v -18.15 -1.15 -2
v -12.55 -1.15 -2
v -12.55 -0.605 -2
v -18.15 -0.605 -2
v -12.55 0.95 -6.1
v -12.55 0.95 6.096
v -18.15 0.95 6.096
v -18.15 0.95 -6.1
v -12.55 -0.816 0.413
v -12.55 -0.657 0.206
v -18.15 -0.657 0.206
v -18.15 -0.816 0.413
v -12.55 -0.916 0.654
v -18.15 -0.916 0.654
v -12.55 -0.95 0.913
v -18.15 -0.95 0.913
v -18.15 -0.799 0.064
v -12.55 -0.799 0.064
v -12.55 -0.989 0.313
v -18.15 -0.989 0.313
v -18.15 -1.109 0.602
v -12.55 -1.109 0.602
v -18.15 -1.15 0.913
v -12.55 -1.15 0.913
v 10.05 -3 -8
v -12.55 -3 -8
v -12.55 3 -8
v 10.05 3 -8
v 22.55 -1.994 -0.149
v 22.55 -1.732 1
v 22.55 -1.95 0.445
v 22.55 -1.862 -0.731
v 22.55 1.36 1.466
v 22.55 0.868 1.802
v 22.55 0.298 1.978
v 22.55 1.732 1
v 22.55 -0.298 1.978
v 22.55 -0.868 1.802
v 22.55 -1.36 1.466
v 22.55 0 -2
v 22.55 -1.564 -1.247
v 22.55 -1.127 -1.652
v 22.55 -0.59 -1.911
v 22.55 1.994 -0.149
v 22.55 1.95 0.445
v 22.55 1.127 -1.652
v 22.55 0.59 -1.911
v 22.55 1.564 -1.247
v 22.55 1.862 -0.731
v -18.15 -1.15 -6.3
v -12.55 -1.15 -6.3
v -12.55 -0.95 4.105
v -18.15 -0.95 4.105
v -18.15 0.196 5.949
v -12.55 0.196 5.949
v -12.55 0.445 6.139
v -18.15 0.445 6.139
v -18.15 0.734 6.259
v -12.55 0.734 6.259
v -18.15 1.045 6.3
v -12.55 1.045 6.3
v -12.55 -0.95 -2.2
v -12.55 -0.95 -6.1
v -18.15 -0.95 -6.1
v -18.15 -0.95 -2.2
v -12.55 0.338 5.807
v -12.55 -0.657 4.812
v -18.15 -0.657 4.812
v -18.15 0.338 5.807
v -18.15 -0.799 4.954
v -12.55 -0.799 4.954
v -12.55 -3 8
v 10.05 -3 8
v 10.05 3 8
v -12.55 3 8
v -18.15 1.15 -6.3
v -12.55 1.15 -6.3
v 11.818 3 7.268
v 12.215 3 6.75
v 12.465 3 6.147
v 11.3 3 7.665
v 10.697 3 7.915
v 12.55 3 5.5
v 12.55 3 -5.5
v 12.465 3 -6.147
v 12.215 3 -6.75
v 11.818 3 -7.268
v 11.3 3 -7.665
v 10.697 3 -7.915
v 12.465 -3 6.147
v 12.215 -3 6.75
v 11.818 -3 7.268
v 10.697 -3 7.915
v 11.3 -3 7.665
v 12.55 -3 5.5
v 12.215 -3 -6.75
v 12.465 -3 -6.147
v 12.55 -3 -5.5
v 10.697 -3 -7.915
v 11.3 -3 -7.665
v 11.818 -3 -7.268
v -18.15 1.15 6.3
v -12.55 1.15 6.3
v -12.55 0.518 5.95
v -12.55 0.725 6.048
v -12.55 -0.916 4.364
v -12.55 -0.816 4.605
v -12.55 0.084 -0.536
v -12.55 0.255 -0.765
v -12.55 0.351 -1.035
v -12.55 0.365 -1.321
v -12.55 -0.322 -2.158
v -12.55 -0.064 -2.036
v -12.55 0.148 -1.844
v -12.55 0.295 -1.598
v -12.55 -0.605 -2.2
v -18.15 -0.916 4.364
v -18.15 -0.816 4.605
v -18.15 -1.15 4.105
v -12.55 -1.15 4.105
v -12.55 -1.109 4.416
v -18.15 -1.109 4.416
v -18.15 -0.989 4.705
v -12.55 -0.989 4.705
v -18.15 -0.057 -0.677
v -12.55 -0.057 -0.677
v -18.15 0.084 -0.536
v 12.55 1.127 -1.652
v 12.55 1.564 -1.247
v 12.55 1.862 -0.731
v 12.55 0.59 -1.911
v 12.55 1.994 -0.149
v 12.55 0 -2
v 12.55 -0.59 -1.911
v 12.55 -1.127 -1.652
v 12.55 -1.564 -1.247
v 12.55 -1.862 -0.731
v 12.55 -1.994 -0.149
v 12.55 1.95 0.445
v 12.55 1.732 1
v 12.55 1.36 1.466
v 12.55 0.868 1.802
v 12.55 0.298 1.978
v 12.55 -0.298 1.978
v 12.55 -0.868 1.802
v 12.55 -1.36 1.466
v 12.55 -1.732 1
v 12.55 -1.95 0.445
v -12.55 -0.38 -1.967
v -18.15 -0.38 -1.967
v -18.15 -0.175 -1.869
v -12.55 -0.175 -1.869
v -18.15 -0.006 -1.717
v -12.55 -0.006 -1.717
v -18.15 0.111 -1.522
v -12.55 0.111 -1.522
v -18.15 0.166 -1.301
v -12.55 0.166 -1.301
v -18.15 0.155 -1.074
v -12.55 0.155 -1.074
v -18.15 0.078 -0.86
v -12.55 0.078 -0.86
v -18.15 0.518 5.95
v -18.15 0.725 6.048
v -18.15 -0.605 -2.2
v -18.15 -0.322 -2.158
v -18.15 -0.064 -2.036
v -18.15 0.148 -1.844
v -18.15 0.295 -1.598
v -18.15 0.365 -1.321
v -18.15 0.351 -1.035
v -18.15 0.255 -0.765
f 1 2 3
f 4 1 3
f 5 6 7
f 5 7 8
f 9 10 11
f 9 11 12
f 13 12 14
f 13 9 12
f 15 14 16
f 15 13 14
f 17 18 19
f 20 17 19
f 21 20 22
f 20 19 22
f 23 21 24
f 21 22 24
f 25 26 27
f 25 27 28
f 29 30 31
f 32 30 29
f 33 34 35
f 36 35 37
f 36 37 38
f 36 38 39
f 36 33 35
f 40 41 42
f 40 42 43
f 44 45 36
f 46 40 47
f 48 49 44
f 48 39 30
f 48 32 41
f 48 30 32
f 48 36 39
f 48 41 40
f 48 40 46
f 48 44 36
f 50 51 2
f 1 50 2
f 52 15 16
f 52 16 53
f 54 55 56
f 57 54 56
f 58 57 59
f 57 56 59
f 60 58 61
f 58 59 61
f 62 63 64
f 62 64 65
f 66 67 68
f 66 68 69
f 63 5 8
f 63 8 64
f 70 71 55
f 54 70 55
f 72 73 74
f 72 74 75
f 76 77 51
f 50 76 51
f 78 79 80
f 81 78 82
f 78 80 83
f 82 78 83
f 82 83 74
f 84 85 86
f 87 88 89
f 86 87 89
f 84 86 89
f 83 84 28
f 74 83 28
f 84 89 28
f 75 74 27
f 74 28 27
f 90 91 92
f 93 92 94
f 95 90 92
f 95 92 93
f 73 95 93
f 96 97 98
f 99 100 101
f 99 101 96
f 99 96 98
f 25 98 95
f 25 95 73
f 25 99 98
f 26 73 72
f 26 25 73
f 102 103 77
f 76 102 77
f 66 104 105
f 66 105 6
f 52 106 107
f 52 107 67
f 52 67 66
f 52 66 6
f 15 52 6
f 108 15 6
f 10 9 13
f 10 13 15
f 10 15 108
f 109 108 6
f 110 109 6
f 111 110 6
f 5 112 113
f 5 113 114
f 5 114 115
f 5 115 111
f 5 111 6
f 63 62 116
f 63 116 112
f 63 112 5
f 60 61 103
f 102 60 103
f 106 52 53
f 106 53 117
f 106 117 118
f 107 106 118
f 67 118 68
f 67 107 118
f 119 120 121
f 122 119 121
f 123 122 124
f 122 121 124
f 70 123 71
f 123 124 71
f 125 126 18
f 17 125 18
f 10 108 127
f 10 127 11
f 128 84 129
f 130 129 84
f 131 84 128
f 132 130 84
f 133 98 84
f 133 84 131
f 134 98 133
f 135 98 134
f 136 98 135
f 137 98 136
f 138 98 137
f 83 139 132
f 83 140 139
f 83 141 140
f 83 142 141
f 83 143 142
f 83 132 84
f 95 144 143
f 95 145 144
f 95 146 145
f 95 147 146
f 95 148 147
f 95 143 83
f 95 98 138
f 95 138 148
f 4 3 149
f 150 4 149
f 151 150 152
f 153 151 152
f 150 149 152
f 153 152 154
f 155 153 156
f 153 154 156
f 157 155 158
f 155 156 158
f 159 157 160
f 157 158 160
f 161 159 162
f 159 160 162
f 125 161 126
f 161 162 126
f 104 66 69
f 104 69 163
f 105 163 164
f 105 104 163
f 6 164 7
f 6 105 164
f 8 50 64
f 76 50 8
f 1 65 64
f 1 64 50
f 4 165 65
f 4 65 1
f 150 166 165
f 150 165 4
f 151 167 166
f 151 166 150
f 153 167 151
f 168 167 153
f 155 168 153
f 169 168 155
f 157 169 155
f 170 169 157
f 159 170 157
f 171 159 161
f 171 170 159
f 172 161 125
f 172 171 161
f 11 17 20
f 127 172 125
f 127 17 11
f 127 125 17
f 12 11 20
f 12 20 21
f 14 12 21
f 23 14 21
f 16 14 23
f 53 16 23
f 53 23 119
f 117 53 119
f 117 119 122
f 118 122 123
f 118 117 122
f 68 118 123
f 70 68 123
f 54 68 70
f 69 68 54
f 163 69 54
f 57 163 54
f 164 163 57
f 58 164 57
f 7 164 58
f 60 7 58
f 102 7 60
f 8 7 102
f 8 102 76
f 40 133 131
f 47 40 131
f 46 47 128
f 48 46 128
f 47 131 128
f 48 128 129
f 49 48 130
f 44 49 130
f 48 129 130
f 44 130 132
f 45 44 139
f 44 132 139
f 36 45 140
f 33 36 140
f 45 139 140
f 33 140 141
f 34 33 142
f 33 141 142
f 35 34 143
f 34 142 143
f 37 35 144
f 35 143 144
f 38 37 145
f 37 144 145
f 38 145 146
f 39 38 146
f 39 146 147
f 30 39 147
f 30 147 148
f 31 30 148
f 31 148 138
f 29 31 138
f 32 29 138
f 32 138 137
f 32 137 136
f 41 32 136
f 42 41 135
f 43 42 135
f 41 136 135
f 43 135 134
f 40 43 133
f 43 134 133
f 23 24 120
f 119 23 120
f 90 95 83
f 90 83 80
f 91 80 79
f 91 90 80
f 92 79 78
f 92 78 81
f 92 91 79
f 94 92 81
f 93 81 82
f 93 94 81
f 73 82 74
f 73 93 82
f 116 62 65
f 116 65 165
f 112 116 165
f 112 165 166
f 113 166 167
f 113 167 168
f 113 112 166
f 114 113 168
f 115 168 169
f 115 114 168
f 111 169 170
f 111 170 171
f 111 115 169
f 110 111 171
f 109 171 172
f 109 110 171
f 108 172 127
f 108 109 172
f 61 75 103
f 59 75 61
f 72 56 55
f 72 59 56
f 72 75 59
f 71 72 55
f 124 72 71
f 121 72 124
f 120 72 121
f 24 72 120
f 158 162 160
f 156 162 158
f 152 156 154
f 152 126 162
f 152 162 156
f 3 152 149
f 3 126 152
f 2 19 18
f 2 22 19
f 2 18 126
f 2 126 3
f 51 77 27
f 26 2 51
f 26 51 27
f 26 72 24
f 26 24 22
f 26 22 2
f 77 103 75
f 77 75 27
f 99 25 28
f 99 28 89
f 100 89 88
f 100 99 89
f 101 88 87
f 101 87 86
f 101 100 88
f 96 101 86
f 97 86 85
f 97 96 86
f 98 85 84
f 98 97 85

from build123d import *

# Parameters (mm, degrees)
BOSS_EXTRUDE1_DEPTH      = 3
BOSS_EXTRUDE1_DEPTH_BACK = 3
BOSS_EXTRUDE2_DEPTH      = 5.6
SKETCH3_R                = 2
BOSS_EXTRUDE3_DEPTH      = 10


with BuildPart() as part:
    # Sketch1 → Boss-Extrude1 (new, two sides: drawn at the far end of the back side and taken through both)
    with BuildSketch(Plane(origin=(0, 0, 0), x_dir=(1, 0, 0), z_dir=(0, 1, 0)).offset(-BOSS_EXTRUDE1_DEPTH_BACK)):
        with BuildLine():
            Line((-12.55, 8), (10.05, 8))
            ThreePointArc((10.05, 8), (11.817766953, 7.267766953), (12.55, 5.5))
            Line((12.55, 5.5), (12.55, -5.5))
            ThreePointArc((12.55, -5.5), (11.817766953, -7.267766953), (10.05, -8))
            Line((10.05, -8), (-12.55, -8))
            Line((-12.55, -8), (-12.55, 8))
        make_face()
    extrude(amount=BOSS_EXTRUDE1_DEPTH + BOSS_EXTRUDE1_DEPTH_BACK)

    # Sketch2 → Boss-Extrude2 (add)
    with BuildSketch(Plane.ZY.offset(12.55)):
        with BuildLine():
            Line((6.3, 1.044645313), (6.3, 1.15))
            Line((6.3, 1.15), (-6.3, 1.15))
            Line((-6.3, 1.15), (-6.3, -1.15))
            Line((-6.3, -1.15), (-2, -1.15))
            Line((-2, -1.15), (-2, -0.605330086))
            ThreePointArc((-2, -0.605330086), (-1.52157966, 0.110676552), (-0.676992245, -0.05732233))
            Line((-0.676992245, -0.05732233), (0.064213562, -0.798528137))
            ThreePointArc((0.064213562, -0.798528137), (0.453521581, -1.058655439), (0.9127417, -1.15))
            Line((0.9127417, -1.15), (4.105354687, -1.15))
            ThreePointArc((4.105354687, -1.15), (4.564574806, -1.058655439), (4.953882825, -0.798528137))
            Line((4.953882825, -0.798528137), (5.948528137, 0.196117175))
            ThreePointArc((5.948528137, 0.196117175), (6.208655439, 0.585425194), (6.3, 1.044645313))
        make_face()
        with BuildLine():
            Line((4.812461468, -0.657106781), (5.807106781, 0.337538532))
            ThreePointArc((5.807106781, 0.337538532), (6.004712185, 0.618622002), (6.095511057, 0.95))
            Line((6.095511057, 0.95), (-6.1, 0.95))
            Line((-6.1, 0.95), (-6.1, -0.95))
            Line((-6.1, -0.95), (-2.2, -0.95))
            Line((-2.2, -0.95), (-2.2, -0.605330086))
            ThreePointArc((-2.2, -0.605330086), (-1.598116347, 0.295452458), (-0.535570888, 0.084099026))
            Line((-0.535570888, 0.084099026), (0.205634919, -0.657106781))
            ThreePointArc((0.205634919, -0.657106781), (0.530058267, -0.873879533), (0.9127417, -0.95))
            Line((0.9127417, -0.95), (4.105354687, -0.95))
            ThreePointArc((4.105354687, -0.95), (4.48803812, -0.873879533), (4.812461468, -0.657106781))
        make_face(mode=Mode.SUBTRACT)
    extrude(amount=BOSS_EXTRUDE2_DEPTH)

    # Sketch3 → Boss-Extrude3 (add)
    with BuildSketch(Plane(origin=(12.55, 0, 0), x_dir=(0, 0, -1), z_dir=(1, 0, 0))):
        Circle(SKETCH3_R)
    extrude(amount=BOSS_EXTRUDE3_DEPTH)


solid = part.part
